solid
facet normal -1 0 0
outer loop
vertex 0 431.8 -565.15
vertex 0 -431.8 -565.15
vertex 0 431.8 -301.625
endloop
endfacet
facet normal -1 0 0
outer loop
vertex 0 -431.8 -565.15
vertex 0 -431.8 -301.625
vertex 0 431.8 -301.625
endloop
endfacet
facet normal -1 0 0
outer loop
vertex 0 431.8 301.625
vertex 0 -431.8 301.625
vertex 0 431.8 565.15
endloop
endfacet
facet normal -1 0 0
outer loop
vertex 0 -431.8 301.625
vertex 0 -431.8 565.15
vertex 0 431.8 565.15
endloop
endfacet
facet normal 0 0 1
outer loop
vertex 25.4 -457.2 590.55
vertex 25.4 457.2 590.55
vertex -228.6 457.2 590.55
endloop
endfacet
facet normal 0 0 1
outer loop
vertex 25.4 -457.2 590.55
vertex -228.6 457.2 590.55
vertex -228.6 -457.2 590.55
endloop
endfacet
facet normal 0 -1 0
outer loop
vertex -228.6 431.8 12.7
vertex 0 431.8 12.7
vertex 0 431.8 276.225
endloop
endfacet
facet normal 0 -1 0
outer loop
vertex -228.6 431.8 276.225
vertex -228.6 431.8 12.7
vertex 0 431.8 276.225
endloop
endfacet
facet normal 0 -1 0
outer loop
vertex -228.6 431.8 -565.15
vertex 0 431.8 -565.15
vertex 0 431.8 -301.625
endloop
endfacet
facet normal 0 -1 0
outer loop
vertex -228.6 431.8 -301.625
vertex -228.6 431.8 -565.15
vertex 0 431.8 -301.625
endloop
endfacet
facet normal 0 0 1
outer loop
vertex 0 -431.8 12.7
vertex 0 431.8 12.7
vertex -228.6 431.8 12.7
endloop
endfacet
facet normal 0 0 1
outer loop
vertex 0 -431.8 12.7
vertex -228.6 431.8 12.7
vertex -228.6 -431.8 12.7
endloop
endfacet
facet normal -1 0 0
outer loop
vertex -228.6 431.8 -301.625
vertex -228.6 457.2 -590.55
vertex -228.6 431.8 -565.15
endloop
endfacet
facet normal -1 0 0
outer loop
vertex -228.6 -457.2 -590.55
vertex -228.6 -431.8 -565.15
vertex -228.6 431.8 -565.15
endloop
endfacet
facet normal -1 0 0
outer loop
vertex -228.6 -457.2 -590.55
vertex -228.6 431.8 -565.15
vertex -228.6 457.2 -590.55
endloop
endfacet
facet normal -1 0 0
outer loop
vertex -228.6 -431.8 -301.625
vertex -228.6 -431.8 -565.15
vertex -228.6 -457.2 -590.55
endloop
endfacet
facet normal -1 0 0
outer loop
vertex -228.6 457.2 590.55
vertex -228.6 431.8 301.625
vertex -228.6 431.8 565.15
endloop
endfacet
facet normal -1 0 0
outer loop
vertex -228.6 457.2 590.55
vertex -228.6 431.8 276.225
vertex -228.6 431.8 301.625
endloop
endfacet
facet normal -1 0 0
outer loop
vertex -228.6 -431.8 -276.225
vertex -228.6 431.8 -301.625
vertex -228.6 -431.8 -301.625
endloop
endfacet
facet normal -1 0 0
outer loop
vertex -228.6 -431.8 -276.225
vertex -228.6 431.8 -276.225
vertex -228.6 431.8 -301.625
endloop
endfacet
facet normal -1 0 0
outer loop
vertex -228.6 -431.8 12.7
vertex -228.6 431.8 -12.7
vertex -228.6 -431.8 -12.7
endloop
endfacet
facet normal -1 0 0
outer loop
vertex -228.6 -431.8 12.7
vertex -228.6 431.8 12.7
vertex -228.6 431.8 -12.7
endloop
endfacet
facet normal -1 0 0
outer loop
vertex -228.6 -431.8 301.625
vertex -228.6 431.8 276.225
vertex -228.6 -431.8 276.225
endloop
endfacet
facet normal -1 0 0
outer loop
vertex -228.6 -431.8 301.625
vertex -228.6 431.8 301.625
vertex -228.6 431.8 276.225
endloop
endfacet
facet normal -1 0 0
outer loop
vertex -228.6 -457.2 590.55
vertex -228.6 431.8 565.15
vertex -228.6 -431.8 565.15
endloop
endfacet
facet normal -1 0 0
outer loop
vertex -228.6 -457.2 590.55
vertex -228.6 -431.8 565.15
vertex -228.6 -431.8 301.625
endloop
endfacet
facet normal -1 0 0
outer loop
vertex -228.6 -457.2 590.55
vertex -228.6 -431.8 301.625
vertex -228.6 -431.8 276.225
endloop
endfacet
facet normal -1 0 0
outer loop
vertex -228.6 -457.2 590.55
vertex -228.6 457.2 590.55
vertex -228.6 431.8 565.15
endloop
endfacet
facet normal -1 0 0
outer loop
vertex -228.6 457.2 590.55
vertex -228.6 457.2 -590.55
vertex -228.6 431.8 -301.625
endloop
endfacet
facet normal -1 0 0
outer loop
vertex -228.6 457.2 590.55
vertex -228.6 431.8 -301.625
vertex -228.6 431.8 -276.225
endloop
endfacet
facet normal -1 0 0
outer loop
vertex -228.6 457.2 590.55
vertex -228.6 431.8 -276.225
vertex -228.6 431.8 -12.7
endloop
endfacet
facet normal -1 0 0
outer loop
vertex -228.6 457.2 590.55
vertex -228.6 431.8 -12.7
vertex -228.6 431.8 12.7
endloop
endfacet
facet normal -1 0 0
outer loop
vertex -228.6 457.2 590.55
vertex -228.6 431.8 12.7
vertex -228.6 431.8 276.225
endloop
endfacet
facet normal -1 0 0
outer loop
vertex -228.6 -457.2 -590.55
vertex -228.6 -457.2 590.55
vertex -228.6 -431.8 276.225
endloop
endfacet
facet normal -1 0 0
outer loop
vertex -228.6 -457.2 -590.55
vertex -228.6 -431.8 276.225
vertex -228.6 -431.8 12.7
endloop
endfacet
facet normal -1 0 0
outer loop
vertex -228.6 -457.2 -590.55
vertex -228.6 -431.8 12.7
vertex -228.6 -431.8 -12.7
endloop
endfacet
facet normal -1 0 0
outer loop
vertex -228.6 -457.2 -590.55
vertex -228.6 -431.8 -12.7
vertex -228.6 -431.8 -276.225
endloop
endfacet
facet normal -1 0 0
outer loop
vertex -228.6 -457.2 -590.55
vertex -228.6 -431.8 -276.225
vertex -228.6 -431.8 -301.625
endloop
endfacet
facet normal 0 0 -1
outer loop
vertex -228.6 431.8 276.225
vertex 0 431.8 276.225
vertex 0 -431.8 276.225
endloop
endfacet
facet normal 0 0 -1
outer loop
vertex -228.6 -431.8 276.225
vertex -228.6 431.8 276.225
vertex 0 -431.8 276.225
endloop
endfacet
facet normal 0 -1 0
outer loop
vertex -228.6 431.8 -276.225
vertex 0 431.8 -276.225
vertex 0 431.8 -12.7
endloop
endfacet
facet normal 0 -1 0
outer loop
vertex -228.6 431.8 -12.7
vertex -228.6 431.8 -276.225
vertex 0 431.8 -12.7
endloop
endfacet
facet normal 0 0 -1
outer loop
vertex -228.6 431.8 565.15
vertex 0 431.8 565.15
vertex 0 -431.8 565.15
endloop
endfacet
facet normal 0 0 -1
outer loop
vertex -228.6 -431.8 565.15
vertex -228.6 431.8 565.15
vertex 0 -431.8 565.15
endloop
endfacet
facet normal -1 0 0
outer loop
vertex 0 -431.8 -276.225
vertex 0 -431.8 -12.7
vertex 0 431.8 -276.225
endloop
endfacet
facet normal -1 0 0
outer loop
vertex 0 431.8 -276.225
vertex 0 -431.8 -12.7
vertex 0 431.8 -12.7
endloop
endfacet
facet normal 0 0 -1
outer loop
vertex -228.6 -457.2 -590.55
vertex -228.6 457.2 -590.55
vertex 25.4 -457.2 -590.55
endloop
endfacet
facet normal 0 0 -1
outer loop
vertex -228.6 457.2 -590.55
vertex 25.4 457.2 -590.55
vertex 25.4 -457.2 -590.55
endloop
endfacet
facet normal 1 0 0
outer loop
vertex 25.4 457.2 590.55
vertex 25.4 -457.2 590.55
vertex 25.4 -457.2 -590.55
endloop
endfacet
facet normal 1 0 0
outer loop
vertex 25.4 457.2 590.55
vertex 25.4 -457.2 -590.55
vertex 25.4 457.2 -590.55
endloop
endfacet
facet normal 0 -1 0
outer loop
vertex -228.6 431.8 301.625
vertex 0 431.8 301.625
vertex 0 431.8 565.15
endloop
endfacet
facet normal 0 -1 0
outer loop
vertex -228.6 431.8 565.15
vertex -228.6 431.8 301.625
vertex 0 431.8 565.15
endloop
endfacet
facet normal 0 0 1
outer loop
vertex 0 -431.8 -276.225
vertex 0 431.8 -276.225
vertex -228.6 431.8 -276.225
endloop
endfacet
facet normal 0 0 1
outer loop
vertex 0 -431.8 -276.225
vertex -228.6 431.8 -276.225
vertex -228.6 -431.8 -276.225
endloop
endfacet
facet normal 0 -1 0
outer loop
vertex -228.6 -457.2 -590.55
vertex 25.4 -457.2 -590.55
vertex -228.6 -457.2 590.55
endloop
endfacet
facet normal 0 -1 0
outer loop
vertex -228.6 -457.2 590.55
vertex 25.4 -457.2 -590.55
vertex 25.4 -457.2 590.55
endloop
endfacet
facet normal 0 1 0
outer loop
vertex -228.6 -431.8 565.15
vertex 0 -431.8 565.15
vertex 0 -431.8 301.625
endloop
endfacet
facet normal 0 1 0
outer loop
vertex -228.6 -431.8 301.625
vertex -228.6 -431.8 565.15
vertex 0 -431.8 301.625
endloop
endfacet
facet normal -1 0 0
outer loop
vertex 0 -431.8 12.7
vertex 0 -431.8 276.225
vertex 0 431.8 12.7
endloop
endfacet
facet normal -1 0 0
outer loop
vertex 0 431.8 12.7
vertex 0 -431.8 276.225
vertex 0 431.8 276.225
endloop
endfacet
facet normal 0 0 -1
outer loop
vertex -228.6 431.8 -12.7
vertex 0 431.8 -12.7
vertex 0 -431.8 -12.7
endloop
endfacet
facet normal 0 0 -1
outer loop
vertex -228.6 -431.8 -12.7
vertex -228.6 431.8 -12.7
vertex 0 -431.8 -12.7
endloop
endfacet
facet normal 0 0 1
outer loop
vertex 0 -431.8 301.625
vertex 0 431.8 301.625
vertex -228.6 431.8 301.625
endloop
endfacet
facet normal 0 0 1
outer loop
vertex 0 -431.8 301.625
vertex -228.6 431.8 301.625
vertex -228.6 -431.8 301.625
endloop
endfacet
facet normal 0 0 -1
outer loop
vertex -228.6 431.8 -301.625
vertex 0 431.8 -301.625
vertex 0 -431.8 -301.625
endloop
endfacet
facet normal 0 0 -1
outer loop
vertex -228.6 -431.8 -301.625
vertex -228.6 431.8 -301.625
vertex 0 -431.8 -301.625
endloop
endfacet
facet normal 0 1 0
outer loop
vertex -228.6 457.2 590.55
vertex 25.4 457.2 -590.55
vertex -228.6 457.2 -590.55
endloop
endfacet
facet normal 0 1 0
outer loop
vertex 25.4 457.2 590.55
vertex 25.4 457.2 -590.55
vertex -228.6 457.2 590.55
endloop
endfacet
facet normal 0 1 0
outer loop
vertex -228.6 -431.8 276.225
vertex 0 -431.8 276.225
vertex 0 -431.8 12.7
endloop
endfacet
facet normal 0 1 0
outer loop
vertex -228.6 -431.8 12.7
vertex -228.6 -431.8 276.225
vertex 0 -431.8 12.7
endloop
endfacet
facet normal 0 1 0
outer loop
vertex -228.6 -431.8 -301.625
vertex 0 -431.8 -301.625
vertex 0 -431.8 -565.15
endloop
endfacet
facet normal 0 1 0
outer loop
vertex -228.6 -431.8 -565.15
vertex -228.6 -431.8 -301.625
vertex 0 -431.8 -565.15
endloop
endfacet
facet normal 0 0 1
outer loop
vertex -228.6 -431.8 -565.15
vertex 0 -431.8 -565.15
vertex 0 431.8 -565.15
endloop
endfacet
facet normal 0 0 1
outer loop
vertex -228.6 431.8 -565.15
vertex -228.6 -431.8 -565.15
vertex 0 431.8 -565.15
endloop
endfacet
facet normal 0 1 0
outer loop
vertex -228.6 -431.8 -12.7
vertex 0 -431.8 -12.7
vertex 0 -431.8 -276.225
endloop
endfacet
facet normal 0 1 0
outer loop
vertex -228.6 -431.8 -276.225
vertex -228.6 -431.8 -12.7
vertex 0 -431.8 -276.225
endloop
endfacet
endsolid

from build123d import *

# Parameters (mm, degrees)
F0_W     = 914.4
F0_H     = 1181.1
F1_DEPTH = 25.4
F2_W     = 914.4
F2_H     = 1181.1
F2_W_2   = 863.6
F2_H_2   = 25.4
F3_DEPTH = 228.6


with BuildPart() as f1:
    # F0 (on Right) → F1 (new body)
    with BuildSketch(Plane.YZ):
        Rectangle(F0_W, F0_H)
    extrude(amount=F1_DEPTH)

    # F2 (on face) → F3 (join)
    with BuildSketch(Plane(origin=(0, 0, 0), x_dir=(0, -1, 0), z_dir=(-1, 0, 0))):
        Rectangle(F2_W, F2_H)
        Polygon((-431.8, 565.15), (431.8, 565.15), (431.8, 301.625), (431.8, 276.225), (431.8, 12.7), (431.8, -12.7), (431.8, -276.225), (431.8, -301.625), (431.8, -565.15), (-431.8, -565.15), (-431.8, -301.625), (-431.8, -276.225), (-431.8, -12.7), (-431.8, 12.7), (-431.8, 276.225), (-431.8, 301.625), align=None, mode=Mode.SUBTRACT)
        with Locations((0, 288.925)):
            Rectangle(F2_W_2, F2_H_2)
        Rectangle(F2_W_2, F2_H_2)
        with Locations((0, -288.925)):
            Rectangle(F2_W_2, F2_H_2)
    extrude(amount=F3_DEPTH)


solid = f1.part
